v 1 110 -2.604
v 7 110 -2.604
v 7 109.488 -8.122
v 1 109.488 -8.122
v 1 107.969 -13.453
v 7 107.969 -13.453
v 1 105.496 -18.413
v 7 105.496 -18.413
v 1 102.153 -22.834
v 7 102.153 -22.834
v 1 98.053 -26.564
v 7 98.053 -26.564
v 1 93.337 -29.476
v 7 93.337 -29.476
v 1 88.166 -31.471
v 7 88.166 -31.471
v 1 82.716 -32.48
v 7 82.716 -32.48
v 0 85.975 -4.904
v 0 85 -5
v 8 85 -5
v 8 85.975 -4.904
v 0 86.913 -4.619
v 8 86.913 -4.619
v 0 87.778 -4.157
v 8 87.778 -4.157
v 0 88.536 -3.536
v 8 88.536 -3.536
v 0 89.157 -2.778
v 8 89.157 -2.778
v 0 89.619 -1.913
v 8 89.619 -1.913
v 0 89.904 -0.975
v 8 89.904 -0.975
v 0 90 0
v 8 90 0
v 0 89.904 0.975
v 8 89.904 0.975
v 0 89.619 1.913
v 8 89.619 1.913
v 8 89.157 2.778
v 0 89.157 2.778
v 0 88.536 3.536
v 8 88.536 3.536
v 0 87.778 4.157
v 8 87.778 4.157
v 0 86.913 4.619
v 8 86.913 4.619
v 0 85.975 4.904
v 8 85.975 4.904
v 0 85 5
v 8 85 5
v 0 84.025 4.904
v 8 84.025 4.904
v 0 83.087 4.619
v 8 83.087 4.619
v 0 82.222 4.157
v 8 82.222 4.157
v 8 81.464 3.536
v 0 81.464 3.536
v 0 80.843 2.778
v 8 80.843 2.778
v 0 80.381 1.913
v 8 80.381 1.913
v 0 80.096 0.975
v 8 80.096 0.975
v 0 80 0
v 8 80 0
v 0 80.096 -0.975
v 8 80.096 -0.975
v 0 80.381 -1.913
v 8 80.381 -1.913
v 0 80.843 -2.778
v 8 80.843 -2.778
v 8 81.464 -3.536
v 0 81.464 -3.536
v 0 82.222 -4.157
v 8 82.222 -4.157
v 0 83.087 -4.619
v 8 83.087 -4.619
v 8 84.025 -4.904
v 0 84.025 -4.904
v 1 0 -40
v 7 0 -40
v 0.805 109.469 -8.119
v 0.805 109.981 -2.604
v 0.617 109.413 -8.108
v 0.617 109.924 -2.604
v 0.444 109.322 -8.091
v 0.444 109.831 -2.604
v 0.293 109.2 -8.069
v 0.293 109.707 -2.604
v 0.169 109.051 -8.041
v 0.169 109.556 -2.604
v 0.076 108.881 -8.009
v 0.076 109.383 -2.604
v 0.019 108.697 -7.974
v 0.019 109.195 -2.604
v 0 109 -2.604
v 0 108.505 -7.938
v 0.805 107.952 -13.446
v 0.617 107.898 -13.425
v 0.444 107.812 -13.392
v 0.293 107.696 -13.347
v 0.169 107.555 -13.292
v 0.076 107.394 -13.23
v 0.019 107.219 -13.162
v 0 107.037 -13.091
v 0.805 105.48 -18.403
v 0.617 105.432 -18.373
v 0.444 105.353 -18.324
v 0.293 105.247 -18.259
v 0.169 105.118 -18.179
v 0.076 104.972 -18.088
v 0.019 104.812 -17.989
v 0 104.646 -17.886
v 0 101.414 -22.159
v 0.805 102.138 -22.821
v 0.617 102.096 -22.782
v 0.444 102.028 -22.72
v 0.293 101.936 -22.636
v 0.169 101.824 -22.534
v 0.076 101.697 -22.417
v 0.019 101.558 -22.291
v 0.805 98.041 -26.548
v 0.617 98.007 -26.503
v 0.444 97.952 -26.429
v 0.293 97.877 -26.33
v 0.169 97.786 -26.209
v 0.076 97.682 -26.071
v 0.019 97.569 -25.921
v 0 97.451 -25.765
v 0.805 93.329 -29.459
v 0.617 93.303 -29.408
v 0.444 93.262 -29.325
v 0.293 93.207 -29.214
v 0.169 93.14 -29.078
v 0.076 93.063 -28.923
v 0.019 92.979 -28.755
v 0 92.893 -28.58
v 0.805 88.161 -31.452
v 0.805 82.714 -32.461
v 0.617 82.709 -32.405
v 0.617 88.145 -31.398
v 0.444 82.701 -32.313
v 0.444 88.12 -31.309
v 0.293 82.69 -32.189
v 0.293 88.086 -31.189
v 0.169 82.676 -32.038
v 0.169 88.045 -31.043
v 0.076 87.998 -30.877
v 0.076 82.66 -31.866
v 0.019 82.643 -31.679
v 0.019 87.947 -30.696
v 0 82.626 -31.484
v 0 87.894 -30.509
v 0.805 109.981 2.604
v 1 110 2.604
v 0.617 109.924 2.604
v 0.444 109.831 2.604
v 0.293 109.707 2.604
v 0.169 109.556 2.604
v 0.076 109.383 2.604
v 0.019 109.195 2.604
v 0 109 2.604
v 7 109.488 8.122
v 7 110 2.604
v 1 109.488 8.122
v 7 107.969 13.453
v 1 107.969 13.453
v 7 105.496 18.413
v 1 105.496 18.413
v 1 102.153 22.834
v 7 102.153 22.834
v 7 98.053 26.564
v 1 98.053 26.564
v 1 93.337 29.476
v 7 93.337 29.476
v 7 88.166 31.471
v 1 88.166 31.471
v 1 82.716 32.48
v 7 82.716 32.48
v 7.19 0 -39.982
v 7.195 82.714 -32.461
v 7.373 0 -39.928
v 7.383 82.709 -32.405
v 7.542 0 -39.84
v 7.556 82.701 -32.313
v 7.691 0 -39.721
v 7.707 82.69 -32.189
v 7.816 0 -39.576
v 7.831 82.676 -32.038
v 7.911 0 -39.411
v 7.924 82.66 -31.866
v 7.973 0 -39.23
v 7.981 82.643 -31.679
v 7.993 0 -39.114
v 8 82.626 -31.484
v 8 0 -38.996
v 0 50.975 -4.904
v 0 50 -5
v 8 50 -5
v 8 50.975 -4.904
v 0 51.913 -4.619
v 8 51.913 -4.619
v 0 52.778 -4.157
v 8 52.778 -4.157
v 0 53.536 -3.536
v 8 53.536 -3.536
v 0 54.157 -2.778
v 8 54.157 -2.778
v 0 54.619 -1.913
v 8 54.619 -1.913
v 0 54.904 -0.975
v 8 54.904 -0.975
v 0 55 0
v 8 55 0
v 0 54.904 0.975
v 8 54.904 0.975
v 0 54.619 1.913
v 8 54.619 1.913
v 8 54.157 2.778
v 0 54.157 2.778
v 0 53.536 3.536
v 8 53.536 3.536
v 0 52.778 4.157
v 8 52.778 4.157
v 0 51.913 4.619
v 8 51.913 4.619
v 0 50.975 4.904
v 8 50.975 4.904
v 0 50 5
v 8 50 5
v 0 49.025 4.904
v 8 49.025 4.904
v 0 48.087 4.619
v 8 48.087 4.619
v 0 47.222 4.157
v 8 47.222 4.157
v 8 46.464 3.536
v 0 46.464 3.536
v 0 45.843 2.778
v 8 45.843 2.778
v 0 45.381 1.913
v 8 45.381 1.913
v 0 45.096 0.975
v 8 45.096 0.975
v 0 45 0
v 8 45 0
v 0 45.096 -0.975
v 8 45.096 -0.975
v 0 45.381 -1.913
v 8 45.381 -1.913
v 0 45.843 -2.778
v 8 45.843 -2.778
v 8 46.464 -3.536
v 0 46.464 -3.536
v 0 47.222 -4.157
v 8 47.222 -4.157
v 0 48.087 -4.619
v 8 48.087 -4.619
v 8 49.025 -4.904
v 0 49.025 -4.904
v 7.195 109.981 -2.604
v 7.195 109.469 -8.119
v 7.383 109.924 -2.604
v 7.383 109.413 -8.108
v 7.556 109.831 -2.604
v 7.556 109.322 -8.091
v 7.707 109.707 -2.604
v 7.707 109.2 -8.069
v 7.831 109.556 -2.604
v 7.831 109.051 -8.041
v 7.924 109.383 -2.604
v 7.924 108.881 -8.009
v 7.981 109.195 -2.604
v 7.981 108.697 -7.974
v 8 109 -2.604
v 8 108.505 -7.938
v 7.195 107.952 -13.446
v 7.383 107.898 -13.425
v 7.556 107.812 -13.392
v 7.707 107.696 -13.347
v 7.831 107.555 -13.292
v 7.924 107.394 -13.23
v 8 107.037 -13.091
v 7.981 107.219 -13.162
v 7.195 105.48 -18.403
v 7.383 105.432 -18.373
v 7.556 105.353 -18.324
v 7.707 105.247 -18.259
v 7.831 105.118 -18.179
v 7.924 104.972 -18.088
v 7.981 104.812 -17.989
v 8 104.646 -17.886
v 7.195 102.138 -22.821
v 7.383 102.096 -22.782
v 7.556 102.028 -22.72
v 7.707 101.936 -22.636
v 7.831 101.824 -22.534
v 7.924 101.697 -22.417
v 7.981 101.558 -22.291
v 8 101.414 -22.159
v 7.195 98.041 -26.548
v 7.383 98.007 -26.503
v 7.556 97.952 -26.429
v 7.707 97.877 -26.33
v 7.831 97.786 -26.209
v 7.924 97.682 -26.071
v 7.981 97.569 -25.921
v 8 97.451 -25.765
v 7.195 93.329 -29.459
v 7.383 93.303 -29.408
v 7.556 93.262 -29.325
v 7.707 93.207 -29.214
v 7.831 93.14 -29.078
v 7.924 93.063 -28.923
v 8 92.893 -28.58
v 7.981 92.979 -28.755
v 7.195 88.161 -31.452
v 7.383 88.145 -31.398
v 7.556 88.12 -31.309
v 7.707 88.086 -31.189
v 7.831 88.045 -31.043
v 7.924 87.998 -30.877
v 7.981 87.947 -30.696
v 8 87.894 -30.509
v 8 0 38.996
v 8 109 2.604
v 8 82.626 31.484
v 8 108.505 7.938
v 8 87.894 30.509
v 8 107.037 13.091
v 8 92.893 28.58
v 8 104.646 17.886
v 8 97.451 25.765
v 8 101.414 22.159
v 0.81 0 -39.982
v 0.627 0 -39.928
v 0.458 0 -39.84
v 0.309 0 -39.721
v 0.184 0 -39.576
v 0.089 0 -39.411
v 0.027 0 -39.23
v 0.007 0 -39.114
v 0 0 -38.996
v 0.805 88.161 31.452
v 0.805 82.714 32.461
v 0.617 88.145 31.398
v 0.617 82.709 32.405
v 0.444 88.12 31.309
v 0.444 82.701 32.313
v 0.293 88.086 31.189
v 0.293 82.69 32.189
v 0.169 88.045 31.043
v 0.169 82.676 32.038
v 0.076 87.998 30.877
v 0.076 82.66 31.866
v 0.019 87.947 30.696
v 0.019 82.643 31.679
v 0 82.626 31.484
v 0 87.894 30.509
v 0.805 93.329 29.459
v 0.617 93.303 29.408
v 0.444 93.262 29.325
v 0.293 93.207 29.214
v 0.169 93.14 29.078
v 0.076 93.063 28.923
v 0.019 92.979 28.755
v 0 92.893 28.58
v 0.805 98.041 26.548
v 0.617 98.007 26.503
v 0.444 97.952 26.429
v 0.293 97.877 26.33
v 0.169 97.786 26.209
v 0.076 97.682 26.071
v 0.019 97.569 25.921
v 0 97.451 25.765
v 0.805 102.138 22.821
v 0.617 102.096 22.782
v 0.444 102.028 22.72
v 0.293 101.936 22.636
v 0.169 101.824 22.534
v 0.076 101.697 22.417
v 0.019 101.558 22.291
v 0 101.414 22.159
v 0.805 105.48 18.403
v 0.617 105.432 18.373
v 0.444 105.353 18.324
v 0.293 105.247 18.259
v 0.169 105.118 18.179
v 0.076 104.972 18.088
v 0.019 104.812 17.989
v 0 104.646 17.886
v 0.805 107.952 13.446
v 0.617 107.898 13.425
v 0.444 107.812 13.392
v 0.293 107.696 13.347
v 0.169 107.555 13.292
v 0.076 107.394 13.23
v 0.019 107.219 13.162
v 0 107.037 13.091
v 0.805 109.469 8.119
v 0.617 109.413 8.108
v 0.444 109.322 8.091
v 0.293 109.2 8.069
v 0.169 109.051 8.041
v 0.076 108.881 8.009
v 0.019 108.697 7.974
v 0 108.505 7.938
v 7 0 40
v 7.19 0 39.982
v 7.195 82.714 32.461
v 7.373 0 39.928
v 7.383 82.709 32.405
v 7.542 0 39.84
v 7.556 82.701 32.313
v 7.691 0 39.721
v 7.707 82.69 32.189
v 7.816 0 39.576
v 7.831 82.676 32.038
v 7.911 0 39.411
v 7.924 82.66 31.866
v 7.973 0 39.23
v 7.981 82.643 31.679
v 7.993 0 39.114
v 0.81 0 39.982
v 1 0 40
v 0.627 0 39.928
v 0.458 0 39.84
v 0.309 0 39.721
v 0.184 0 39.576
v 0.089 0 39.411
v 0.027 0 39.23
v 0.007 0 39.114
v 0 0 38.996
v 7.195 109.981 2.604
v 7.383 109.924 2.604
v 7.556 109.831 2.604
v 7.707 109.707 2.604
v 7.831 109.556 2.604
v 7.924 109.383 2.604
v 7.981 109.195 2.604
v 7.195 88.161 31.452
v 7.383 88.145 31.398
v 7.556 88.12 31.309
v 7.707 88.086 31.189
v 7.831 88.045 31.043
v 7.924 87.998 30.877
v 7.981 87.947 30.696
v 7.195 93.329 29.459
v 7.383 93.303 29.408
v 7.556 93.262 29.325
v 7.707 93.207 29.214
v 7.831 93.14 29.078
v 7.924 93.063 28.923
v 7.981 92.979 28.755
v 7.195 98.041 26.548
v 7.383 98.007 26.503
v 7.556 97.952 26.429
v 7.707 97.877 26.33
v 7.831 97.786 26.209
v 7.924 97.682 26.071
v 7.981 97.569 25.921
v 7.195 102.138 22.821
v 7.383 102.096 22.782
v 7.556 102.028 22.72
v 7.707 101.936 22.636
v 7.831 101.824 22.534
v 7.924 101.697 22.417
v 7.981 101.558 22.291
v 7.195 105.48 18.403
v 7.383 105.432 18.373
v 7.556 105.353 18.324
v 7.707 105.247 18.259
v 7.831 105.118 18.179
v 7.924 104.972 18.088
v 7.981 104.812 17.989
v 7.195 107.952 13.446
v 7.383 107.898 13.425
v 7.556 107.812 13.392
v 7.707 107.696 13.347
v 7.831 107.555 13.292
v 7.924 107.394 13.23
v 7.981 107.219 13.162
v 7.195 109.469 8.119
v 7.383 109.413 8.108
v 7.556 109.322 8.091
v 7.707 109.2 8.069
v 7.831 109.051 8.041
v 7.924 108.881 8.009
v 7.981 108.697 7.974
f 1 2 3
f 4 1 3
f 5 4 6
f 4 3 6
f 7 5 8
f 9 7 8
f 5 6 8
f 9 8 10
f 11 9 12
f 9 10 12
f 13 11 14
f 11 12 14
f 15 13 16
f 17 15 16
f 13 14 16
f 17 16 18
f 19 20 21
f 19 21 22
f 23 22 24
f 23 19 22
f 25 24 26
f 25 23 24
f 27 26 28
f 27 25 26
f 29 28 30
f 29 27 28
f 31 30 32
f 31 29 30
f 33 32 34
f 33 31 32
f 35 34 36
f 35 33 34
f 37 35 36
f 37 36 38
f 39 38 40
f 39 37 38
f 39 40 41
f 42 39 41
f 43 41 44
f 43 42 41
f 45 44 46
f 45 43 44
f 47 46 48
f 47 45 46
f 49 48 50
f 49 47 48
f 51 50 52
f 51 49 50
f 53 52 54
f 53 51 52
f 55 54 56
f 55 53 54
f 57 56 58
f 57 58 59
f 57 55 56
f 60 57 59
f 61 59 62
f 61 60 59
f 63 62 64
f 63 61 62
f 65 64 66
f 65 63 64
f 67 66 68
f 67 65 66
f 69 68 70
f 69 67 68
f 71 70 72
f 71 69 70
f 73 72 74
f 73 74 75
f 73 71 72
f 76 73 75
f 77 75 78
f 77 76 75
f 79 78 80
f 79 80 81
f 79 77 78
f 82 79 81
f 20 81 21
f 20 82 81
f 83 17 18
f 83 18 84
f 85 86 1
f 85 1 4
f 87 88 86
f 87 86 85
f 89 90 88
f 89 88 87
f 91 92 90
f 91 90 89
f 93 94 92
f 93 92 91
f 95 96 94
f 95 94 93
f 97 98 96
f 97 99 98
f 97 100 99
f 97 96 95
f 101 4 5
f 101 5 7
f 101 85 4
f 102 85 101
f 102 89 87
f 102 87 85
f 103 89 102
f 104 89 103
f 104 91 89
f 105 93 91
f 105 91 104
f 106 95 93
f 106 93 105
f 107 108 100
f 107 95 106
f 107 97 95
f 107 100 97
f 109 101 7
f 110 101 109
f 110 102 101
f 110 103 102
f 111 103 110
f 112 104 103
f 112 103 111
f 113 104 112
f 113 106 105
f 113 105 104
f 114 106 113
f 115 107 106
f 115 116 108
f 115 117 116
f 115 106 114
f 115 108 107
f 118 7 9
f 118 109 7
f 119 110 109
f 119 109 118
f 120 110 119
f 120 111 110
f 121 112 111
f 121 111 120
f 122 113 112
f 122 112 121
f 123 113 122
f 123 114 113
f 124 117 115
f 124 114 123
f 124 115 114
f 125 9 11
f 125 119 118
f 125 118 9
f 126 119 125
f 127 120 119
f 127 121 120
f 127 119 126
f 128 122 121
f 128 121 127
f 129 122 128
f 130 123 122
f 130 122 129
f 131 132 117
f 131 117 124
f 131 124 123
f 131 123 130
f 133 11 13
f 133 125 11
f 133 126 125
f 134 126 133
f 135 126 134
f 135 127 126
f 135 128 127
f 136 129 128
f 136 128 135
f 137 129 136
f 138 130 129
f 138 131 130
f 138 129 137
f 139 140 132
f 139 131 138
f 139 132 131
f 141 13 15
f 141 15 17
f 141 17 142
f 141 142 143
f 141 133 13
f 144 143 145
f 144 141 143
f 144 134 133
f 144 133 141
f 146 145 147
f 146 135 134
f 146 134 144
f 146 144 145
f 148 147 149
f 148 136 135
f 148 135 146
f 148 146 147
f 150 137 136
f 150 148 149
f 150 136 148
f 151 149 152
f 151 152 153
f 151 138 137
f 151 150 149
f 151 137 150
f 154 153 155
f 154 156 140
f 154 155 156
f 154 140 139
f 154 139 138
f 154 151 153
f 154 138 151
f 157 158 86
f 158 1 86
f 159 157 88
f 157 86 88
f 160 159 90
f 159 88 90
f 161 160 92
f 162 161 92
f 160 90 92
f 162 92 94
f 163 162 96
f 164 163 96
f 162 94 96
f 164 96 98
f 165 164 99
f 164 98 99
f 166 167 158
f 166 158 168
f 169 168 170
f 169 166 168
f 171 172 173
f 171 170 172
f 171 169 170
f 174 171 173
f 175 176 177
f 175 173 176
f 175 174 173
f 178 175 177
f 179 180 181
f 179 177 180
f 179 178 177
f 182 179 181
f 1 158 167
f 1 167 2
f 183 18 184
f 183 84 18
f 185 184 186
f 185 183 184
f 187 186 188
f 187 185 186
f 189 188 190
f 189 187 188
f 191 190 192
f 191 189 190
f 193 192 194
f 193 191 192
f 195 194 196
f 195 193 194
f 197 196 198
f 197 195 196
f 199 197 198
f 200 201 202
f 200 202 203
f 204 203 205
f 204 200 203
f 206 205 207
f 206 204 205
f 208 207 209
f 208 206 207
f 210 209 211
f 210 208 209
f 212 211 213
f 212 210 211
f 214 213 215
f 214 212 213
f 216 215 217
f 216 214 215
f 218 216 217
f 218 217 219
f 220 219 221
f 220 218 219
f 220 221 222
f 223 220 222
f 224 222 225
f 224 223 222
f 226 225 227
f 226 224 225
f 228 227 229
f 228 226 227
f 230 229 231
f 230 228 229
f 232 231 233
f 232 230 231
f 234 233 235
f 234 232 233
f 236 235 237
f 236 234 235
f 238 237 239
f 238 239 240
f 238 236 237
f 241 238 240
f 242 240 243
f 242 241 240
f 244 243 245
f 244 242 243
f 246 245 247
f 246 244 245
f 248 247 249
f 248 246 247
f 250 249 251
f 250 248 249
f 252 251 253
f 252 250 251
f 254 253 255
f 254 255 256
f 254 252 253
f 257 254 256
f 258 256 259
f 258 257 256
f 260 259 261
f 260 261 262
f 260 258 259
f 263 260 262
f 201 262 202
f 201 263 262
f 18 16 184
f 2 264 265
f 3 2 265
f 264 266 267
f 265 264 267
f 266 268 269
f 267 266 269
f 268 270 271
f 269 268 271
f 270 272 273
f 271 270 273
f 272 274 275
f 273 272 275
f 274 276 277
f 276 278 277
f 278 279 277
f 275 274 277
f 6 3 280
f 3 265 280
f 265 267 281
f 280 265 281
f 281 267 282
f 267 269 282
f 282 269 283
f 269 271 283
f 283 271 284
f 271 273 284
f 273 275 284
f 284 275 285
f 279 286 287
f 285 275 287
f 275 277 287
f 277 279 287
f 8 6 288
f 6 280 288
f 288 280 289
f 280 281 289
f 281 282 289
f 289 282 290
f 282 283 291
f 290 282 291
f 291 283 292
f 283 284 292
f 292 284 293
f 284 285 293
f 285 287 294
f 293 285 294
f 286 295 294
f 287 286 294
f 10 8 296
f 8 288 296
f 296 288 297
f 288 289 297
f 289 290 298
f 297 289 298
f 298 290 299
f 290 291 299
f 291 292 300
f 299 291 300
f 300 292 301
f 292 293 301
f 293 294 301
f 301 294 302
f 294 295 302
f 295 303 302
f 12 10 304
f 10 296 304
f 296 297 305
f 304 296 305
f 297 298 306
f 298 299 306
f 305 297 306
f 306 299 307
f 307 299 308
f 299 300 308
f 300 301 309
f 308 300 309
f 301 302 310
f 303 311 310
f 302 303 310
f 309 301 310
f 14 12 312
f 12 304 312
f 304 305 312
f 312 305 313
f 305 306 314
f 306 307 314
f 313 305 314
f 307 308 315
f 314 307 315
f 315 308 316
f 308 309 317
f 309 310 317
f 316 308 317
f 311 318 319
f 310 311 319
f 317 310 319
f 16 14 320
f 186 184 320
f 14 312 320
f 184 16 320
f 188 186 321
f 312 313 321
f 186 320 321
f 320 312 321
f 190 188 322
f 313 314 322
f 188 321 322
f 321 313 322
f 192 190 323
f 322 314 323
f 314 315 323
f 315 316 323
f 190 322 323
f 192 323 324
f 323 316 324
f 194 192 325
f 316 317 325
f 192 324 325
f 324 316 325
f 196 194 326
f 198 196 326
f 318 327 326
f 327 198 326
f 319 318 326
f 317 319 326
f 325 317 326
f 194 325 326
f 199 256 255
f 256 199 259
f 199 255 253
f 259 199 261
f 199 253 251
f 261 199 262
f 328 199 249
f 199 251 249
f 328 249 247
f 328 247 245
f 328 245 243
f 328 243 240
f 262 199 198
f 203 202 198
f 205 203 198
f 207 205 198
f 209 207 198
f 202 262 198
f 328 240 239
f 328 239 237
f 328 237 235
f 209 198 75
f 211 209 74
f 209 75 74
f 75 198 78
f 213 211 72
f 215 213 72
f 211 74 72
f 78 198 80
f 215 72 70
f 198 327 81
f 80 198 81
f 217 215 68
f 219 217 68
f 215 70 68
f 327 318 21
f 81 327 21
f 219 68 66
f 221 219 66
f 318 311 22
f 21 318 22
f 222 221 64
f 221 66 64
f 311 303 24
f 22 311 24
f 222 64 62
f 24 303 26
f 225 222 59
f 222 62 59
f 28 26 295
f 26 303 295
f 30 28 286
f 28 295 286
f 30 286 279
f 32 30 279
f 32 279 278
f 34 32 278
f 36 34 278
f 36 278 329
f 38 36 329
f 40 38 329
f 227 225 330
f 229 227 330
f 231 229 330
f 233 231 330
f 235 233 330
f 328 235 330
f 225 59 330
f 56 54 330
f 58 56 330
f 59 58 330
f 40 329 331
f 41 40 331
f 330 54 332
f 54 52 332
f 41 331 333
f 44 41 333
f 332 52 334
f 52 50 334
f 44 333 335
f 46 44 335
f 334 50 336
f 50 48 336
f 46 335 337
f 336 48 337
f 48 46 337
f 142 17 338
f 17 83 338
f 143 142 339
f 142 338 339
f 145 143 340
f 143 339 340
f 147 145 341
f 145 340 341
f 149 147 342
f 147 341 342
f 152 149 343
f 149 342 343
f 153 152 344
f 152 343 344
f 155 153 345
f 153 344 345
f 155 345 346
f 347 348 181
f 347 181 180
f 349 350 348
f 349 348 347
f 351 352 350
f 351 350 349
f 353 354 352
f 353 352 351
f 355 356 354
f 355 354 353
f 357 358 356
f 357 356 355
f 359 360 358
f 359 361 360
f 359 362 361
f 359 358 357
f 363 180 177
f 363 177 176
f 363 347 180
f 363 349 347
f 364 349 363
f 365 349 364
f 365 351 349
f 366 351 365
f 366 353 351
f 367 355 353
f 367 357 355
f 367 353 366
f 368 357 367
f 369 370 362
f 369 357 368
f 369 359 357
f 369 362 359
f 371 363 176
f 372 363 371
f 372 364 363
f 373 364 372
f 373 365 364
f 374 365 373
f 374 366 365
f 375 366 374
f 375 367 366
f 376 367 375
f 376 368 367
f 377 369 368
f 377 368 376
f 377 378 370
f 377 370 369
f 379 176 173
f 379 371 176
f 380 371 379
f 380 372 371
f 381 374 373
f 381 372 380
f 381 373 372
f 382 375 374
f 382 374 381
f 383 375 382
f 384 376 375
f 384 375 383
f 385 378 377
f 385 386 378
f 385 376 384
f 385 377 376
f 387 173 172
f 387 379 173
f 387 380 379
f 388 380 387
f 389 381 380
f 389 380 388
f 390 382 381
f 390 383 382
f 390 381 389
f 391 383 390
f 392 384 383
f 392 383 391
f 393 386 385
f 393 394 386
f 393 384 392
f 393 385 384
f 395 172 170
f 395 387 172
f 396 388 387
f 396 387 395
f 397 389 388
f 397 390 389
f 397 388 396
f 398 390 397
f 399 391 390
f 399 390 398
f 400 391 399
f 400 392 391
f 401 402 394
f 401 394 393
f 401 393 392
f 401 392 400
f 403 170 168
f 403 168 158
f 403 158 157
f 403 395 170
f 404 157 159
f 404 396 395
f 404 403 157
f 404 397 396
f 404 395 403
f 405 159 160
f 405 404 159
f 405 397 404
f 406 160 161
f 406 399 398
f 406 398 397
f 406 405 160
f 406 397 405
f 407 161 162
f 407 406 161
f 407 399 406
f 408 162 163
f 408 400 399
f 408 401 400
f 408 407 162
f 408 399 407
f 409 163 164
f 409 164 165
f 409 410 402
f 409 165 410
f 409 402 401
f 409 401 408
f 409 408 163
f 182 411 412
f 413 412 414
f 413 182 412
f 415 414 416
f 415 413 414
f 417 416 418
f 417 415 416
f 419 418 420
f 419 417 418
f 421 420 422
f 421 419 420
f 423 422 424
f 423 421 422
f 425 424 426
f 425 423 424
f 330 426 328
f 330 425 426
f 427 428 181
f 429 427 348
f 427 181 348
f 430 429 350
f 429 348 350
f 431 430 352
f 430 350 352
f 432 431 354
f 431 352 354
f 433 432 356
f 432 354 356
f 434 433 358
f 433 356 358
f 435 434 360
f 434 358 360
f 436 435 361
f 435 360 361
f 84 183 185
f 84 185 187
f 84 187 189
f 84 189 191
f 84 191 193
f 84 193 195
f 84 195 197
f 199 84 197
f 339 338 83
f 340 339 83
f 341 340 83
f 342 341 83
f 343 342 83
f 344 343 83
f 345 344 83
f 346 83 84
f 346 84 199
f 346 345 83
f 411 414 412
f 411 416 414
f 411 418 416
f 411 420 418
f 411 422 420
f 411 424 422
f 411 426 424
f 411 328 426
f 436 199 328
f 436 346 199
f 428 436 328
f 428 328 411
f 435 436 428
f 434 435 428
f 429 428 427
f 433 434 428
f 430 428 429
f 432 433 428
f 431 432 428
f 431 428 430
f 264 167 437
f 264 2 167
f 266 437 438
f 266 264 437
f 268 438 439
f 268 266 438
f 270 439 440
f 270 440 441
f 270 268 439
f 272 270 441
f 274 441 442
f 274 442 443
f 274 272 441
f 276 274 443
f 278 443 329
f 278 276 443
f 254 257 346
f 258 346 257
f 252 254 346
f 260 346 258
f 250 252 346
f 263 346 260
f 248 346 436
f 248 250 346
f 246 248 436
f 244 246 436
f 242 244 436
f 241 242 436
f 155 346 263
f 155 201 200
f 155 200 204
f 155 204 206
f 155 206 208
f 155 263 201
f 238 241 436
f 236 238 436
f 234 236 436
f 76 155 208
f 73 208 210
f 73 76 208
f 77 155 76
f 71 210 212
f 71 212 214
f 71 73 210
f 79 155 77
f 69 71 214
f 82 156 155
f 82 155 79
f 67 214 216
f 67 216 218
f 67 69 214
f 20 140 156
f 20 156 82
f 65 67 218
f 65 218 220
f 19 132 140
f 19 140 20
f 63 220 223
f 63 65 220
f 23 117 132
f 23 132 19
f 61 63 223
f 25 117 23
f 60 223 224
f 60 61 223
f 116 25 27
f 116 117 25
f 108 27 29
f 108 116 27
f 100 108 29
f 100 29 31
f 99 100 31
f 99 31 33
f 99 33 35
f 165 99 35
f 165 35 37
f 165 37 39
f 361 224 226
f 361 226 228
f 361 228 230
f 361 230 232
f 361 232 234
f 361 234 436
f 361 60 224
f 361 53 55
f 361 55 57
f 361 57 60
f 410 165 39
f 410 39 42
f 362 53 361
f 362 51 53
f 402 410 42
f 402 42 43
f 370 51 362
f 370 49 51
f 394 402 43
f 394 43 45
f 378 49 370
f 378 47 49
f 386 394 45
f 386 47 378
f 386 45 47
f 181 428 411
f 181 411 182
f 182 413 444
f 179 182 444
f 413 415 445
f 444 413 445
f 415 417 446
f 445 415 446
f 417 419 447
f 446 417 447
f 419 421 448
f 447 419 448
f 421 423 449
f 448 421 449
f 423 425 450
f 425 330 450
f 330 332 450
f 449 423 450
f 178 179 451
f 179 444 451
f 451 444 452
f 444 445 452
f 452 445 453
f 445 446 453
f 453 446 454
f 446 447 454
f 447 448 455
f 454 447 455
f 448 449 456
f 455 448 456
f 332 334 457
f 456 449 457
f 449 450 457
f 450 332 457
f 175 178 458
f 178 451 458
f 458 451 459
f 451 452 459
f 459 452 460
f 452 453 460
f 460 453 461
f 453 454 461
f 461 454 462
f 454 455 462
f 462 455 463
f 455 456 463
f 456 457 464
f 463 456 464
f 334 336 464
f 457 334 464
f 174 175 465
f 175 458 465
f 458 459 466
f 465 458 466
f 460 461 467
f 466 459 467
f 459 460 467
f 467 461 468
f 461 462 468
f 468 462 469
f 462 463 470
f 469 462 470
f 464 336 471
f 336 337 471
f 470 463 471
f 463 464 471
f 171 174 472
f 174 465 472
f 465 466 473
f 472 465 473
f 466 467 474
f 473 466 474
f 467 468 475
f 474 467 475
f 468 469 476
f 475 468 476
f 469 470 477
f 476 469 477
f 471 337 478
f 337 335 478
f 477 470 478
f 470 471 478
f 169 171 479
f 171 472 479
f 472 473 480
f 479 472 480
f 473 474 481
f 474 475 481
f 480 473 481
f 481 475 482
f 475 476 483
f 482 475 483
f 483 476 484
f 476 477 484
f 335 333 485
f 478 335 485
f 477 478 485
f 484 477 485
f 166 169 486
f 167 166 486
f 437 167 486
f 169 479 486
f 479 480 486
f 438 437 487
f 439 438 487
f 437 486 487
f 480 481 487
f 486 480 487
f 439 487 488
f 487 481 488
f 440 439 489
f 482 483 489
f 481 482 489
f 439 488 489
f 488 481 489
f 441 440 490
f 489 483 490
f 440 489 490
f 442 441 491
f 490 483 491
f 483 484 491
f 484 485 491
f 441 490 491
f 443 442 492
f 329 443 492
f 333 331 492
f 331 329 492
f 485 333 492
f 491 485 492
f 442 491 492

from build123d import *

# Parameters (mm, degrees)
SKICA1_R                = 5
P_IDAT_VYSUNUT_M1_DEPTH = 8
ZAOBLIT1_R              = 30
ZAOBLIT2_R              = 1


with BuildPart() as part:
    # Skica1 → Přidat vysunutím1 (new body)
    with BuildSketch(Plane(origin=(0, 0, 0), x_dir=(0, 0, -1), z_dir=(1, 0, 0))):
        Polygon((-30, 110), (30, 110), (40, 0), (-40, 0), align=None)
        with Locations((0, 85)):
            Circle(SKICA1_R, mode=Mode.SUBTRACT)
        with Locations((0, 50)):
            Circle(SKICA1_R, mode=Mode.SUBTRACT)
    extrude(amount=P_IDAT_VYSUNUT_M1_DEPTH)

    # Zaoblit1
    zaoblit1_edges = [part.edges().sort_by_distance(p)[0] for p in [
        (4, 110, 30),
        (4, 110, -30),
    ]]
    fillet(zaoblit1_edges, radius=ZAOBLIT1_R)

    # Zaoblit2
    zaoblit2_edges = [part.edges().sort_by_distance(p)[0] for p in [
        (0, 110, 0),
        (8, 110, 0),
        (0, 41.358036191, 36.240178528),
        (0, 102.152676717, 22.833709509),
        (0, 102.152676717, -22.833709509),
        (8, 41.358036191, 36.240178528),
        (8, 102.152676717, 22.833709509),
        (8, 102.152676717, -22.833709509),
        (8, 41.358036191, -36.240178528),
        (0, 41.358036191, -36.240178528),
    ]]
    fillet(zaoblit2_edges, radius=ZAOBLIT2_R)


solid = part.part
